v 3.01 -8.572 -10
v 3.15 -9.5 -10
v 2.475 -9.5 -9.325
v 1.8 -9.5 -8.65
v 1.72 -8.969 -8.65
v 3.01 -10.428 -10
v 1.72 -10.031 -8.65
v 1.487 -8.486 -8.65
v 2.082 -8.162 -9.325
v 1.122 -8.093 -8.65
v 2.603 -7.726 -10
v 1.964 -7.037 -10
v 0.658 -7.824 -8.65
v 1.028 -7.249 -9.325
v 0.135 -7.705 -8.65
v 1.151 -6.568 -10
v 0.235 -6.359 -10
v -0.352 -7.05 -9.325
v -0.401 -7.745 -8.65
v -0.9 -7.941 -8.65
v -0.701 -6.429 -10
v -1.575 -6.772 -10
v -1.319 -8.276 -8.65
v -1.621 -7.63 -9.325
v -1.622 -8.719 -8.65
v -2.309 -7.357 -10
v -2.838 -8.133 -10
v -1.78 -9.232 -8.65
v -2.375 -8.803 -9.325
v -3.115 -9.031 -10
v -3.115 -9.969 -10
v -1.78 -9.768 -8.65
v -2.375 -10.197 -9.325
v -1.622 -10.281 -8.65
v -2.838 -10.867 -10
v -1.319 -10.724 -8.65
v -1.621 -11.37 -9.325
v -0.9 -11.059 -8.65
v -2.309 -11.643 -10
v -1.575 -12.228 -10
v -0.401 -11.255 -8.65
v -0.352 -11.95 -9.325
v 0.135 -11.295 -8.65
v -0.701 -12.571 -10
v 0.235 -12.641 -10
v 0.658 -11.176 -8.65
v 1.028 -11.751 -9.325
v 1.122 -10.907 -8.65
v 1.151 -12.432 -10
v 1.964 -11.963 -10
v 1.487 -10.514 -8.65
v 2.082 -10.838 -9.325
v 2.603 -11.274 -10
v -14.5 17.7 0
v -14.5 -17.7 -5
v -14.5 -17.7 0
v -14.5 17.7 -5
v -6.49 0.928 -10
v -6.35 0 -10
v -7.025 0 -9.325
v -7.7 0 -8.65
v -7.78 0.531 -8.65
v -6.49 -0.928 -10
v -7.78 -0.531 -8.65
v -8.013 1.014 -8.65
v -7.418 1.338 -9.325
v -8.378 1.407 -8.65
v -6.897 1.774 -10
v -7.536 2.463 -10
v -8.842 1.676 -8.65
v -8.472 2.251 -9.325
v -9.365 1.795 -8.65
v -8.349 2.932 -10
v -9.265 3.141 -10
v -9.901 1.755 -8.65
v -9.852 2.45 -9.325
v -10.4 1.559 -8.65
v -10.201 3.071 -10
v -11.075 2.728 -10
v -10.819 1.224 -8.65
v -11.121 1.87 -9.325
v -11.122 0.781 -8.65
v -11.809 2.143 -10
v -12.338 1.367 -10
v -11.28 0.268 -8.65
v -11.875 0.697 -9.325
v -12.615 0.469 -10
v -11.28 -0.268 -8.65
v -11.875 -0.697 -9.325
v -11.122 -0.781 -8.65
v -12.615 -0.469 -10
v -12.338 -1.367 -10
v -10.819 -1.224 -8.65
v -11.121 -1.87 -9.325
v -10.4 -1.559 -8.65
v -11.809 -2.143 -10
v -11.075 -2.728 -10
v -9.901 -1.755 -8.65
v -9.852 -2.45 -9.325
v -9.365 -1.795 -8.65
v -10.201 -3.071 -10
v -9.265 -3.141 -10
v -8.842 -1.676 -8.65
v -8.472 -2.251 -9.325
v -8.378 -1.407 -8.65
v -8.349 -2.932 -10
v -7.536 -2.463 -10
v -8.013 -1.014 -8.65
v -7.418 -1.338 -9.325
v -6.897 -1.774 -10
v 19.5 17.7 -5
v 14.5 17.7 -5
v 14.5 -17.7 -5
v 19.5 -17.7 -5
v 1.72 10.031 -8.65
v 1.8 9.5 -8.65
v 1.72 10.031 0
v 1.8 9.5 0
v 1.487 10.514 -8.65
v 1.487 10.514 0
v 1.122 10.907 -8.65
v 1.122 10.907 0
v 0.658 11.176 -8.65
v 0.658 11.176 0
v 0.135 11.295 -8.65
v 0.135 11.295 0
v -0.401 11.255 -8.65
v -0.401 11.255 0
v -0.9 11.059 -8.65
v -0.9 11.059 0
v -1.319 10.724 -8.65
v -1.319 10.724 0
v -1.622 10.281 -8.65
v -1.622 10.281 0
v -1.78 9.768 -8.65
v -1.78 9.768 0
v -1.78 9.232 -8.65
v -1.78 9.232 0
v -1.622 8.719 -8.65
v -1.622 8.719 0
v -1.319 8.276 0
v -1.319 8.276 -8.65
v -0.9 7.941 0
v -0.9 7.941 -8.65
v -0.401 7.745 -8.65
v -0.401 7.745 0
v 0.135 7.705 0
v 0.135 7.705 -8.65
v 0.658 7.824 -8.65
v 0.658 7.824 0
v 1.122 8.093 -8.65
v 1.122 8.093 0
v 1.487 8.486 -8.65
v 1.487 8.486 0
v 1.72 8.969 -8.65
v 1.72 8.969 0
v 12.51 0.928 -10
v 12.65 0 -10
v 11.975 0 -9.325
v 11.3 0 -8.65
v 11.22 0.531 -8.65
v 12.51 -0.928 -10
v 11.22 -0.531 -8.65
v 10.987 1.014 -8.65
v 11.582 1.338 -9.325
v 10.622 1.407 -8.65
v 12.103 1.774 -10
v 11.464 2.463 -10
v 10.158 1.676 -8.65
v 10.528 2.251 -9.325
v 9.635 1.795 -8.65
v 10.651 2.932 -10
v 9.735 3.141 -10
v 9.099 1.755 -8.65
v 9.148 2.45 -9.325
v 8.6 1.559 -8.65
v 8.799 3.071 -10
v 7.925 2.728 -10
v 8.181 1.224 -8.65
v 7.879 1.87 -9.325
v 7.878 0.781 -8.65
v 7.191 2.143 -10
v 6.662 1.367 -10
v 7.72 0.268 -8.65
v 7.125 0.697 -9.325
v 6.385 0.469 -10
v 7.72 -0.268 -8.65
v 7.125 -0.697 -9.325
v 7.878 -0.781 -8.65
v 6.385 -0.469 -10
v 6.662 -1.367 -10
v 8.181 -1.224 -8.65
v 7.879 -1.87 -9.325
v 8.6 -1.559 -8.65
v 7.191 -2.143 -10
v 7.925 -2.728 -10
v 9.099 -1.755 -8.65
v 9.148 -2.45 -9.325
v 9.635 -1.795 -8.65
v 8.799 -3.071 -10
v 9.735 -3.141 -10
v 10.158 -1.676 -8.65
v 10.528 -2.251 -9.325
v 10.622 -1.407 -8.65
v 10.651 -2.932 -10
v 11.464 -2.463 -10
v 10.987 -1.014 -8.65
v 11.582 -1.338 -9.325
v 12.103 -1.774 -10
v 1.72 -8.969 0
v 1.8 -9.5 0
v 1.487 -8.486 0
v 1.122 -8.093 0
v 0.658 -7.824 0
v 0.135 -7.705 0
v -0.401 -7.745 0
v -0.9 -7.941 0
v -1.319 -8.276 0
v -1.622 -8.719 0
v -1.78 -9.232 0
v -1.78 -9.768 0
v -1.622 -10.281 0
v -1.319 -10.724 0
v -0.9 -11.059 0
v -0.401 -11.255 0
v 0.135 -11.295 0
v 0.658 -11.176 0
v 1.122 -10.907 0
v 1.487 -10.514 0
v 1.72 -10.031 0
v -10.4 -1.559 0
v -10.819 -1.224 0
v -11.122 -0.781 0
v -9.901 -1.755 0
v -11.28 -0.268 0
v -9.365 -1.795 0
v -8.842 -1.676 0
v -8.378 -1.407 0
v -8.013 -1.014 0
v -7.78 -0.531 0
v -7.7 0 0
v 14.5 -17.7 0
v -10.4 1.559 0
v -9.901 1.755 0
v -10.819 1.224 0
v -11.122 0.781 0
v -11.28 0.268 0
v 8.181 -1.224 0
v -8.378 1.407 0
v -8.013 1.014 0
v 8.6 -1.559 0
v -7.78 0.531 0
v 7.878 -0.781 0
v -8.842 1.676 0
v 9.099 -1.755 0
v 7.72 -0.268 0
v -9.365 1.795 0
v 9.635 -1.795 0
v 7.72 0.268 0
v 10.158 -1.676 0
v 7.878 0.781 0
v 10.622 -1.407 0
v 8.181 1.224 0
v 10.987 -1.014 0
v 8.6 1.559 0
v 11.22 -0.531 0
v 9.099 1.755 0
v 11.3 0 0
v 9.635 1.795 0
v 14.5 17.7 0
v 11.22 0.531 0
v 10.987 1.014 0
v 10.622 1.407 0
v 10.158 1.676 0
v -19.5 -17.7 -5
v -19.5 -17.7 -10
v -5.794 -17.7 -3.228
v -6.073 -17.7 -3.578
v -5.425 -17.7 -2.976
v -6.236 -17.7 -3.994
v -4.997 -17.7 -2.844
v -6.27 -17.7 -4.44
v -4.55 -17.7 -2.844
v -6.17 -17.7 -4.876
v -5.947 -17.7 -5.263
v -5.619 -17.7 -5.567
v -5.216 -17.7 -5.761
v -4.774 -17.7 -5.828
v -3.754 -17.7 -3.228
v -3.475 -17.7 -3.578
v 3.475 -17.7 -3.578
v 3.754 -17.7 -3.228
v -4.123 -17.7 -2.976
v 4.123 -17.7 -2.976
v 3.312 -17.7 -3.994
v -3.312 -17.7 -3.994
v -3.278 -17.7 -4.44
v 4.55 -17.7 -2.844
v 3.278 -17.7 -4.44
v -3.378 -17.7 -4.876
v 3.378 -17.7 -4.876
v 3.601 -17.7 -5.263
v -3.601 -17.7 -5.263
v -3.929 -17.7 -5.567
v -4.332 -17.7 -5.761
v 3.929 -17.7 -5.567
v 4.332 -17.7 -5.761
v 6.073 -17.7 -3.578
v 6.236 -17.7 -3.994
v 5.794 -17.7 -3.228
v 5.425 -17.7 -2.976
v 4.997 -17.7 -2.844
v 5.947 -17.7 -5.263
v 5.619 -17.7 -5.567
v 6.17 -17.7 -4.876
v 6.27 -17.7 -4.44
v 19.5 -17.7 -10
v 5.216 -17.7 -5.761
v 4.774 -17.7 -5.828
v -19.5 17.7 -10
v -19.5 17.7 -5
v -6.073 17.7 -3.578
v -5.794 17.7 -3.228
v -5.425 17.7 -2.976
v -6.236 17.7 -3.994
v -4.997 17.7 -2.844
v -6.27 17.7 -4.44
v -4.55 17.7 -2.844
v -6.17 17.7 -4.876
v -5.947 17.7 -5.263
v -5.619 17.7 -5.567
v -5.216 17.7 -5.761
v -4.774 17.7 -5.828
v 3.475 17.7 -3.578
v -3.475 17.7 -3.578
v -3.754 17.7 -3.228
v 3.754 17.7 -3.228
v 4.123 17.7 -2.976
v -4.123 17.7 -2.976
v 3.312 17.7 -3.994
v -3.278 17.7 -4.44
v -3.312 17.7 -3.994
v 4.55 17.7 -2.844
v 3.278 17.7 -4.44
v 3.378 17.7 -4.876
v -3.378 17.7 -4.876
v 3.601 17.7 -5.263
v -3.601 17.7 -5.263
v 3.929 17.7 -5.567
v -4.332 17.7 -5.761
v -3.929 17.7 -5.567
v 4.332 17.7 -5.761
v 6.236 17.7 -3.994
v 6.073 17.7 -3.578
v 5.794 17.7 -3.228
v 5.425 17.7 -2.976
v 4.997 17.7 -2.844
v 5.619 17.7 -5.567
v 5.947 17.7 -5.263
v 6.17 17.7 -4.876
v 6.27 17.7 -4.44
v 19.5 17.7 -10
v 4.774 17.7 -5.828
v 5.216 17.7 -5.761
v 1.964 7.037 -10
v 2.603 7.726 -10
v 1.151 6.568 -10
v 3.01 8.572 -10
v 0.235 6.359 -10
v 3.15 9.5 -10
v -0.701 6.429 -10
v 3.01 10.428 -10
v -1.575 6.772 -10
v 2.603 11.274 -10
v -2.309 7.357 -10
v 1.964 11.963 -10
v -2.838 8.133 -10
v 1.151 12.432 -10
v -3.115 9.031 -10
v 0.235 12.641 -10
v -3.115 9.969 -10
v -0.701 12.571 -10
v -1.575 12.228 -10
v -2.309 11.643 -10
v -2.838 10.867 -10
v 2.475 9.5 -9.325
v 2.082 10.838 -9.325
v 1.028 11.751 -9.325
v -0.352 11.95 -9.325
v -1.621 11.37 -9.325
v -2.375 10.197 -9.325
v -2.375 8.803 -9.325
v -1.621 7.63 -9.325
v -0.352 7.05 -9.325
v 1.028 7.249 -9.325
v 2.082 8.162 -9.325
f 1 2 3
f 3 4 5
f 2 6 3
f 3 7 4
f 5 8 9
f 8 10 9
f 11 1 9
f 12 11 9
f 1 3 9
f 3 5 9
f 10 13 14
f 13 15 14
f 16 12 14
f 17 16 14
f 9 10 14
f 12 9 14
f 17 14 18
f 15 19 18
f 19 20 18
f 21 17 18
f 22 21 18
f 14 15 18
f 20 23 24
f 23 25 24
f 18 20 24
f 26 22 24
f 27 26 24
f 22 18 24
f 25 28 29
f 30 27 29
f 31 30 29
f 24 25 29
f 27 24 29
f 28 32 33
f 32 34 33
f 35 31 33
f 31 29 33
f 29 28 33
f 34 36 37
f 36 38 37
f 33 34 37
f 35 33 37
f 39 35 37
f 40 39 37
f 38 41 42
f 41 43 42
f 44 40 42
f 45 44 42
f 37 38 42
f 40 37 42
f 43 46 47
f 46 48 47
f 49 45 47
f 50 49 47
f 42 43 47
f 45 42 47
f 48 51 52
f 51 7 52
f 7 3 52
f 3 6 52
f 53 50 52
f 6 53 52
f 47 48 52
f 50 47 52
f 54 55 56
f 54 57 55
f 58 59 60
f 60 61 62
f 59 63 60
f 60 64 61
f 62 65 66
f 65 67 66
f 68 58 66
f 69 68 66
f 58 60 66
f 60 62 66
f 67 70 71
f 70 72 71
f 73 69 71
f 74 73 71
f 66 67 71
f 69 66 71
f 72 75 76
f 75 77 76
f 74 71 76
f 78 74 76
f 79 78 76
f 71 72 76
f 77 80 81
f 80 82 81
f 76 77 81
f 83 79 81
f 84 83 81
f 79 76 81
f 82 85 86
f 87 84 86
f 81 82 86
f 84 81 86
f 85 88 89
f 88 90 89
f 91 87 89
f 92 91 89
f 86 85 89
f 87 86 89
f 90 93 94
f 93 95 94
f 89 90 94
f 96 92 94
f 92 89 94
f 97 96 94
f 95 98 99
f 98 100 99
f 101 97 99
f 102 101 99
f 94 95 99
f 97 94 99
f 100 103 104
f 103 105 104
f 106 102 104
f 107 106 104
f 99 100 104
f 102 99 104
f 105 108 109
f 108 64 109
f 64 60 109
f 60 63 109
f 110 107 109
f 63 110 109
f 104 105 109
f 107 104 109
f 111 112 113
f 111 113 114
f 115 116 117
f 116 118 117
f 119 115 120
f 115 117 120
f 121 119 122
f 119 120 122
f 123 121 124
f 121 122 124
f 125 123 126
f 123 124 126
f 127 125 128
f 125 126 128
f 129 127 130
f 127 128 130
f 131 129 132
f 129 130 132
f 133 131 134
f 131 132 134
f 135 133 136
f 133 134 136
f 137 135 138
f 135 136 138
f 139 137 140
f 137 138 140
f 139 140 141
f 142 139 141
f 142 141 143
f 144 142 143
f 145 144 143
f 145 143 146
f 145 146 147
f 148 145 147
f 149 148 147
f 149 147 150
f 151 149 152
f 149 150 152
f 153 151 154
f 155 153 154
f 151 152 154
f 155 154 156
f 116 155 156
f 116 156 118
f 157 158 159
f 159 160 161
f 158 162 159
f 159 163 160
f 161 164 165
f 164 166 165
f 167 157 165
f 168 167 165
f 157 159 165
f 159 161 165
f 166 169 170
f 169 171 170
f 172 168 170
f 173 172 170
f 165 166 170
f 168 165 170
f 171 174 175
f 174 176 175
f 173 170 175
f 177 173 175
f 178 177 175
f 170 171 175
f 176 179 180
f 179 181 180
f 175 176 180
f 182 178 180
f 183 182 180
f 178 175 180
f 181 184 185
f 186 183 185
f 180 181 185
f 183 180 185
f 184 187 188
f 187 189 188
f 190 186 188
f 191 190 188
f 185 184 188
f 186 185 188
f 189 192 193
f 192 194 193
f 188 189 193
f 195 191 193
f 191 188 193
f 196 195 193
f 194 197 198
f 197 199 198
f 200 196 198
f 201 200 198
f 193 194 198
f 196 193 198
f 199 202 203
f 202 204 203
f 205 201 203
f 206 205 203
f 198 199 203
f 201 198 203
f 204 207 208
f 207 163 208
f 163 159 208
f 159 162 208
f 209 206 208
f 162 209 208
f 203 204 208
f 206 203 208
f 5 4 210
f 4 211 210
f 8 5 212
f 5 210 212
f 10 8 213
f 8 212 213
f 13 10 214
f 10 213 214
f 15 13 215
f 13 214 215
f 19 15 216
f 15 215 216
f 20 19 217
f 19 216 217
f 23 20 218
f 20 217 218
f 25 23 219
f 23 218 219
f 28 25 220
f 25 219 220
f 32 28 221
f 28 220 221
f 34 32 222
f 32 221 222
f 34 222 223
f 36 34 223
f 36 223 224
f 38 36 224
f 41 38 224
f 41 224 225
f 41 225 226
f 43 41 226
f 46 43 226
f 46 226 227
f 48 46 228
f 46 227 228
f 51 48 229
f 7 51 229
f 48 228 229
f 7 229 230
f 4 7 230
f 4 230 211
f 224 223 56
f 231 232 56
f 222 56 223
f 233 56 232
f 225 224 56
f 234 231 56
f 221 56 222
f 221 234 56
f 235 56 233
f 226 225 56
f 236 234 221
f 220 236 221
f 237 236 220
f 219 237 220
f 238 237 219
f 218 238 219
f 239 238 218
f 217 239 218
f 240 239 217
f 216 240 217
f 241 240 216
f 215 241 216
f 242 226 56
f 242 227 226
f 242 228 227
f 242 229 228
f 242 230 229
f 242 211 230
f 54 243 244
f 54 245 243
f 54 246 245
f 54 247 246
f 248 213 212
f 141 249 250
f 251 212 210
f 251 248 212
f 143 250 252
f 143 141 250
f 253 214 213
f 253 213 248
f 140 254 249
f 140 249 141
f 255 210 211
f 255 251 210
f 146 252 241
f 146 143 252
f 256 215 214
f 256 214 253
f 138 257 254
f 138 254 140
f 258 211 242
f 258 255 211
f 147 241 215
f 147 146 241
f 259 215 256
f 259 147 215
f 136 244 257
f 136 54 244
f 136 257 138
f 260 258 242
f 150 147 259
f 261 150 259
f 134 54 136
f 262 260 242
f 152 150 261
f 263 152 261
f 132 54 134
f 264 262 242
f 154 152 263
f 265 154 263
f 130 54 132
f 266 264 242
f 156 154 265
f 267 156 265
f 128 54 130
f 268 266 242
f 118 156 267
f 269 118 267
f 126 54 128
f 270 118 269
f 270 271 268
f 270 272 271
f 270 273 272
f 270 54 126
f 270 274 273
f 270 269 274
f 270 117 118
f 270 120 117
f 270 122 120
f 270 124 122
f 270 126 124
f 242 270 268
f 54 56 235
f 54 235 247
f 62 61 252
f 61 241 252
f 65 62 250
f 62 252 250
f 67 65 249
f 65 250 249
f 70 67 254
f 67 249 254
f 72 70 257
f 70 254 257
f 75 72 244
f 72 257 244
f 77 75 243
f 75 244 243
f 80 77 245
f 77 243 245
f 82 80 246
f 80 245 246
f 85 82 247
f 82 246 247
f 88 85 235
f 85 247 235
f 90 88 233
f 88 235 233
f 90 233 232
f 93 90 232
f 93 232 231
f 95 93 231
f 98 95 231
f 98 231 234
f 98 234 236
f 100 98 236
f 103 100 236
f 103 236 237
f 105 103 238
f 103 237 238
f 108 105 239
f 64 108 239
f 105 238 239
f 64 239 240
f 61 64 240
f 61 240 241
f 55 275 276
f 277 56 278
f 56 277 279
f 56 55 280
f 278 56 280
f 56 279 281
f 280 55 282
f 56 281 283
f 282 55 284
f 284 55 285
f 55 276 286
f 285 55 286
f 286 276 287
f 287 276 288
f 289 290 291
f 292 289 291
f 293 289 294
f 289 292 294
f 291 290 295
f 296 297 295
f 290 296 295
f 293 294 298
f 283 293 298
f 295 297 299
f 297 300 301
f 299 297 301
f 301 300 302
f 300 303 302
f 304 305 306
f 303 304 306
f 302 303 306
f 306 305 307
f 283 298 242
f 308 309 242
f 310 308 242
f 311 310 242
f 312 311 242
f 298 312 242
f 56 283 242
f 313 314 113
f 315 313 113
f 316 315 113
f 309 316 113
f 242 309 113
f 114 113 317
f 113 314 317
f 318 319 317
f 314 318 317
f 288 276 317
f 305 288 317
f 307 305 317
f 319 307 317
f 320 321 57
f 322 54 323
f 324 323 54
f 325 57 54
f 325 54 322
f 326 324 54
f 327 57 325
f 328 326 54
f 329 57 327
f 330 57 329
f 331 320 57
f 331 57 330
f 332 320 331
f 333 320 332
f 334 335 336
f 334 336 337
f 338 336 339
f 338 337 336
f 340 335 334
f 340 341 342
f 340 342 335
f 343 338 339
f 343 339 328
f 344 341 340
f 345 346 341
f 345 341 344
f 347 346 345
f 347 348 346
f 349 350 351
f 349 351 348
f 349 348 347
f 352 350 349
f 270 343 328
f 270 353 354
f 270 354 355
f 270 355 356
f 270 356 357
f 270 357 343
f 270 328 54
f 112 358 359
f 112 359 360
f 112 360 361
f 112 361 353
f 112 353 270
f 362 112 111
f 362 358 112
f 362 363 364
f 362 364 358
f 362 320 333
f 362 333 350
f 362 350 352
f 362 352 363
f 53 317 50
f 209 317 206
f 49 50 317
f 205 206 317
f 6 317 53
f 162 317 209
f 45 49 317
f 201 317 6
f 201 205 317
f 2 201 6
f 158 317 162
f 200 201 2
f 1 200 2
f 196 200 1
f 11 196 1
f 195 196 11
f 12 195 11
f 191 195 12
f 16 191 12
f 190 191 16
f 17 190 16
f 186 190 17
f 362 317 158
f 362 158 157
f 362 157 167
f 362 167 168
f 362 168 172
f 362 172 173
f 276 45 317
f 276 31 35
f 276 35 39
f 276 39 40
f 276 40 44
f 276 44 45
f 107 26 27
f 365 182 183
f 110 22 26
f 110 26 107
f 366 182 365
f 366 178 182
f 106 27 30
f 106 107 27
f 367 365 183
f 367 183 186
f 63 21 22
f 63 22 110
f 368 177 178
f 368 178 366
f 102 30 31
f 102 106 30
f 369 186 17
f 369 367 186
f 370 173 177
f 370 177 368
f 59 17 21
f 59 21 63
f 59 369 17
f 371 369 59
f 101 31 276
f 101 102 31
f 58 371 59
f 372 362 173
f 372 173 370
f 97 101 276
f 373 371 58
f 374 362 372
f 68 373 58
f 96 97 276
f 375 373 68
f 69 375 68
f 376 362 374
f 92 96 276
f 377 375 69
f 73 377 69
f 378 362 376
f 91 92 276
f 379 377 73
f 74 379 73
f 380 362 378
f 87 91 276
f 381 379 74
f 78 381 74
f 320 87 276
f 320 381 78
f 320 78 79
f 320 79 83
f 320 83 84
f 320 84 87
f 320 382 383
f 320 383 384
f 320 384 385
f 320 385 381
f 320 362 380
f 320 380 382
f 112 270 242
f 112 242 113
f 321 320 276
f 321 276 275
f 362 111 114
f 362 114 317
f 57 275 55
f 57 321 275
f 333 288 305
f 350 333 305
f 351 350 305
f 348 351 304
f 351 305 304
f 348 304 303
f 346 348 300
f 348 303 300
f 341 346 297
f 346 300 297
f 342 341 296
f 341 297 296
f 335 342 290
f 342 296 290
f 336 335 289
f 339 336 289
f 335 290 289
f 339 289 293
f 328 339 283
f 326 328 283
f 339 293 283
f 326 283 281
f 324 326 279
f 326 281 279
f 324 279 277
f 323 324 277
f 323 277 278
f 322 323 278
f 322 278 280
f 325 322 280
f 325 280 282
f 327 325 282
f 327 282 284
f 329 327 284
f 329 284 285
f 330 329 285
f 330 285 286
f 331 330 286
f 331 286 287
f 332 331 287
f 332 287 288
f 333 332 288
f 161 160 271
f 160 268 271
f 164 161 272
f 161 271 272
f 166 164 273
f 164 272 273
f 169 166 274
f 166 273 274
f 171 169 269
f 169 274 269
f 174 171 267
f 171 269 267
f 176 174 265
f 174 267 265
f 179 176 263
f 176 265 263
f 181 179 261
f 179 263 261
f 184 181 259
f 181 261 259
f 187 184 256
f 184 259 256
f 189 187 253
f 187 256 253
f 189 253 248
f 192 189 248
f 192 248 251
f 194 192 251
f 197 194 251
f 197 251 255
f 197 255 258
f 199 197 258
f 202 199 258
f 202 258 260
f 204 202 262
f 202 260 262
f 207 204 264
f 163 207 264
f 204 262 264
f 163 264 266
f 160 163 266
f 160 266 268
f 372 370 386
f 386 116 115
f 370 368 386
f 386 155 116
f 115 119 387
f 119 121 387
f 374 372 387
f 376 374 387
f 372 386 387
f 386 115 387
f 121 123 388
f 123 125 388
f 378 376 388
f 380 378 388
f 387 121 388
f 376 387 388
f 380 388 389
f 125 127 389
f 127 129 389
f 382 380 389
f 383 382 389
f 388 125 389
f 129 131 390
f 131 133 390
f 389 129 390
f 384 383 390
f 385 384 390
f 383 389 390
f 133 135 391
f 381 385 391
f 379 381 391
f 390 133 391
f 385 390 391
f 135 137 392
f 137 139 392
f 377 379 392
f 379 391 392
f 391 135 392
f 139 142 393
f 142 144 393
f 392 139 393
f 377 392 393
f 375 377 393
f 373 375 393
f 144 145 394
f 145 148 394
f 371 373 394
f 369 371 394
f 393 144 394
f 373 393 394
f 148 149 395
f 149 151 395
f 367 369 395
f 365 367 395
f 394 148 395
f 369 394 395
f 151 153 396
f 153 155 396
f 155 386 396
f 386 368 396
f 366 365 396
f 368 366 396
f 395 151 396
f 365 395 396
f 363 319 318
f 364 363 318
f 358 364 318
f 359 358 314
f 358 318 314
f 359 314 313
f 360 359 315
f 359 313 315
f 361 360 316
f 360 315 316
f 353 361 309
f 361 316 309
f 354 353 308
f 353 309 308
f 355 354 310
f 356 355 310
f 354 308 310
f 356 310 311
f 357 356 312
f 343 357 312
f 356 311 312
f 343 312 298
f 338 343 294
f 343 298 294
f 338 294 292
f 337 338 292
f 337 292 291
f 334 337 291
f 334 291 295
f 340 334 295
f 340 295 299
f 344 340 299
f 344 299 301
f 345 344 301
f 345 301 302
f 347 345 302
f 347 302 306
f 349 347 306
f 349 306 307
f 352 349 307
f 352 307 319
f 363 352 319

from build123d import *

# Parameters (mm, degrees)
BOSS_EXTRUDE1_DEPTH                             = 17.7
CSK_FOR_M3_FLAT_HEAD_MACHINE_SCREW1_D           = 3.6
CSK_FOR_M3_FLAT_HEAD_MACHINE_SCREW1_CSINK_D     = 6.3
CSK_FOR_M3_FLAT_HEAD_MACHINE_SCREW1_CSINK_ANGLE = 90
F_3_0MM_PRESS_DOWEL_HOLE1_D                     = 3


with BuildPart() as part:
    # Sketch1 → Boss-Extrude1 (new, symmetric)
    with BuildSketch(Plane(origin=(0, 0, 0), x_dir=(1, 0, 0), z_dir=(0, 1, 0))):
        Polygon((-14.5, 0), (14.5, 0), (14.5, 5), (19.5, 5), (19.5, 10), (-19.5, 10), (-19.5, 5), (-14.5, 5), align=None)
    extrude(amount=BOSS_EXTRUDE1_DEPTH, both=True)

    # CSK for M3 Flat Head Machine Screw1 (through all)
    with Locations(Plane(origin=(0, 0, -10), x_dir=(-1, 0, 0), z_dir=(0, 0, -1))):
        with Locations((0, 9.5), (-9.5, 0), (9.5, 0), (0, -9.5)):
            CounterSinkHole(CSK_FOR_M3_FLAT_HEAD_MACHINE_SCREW1_D / 2, CSK_FOR_M3_FLAT_HEAD_MACHINE_SCREW1_CSINK_D / 2, counter_sink_angle=CSK_FOR_M3_FLAT_HEAD_MACHINE_SCREW1_CSINK_ANGLE)

    # Ø3.0mm Press Dowel Hole1 (through all)
    with Locations(Plane(origin=(-4.77392109, 17.7, -4.32762779), x_dir=(0, 0, 1), z_dir=(0, 1, 0))):
        with Locations((0, 0), (0, 9.54784218)):
            Hole(F_3_0MM_PRESS_DOWEL_HOLE1_D / 2)


solid = part.part
